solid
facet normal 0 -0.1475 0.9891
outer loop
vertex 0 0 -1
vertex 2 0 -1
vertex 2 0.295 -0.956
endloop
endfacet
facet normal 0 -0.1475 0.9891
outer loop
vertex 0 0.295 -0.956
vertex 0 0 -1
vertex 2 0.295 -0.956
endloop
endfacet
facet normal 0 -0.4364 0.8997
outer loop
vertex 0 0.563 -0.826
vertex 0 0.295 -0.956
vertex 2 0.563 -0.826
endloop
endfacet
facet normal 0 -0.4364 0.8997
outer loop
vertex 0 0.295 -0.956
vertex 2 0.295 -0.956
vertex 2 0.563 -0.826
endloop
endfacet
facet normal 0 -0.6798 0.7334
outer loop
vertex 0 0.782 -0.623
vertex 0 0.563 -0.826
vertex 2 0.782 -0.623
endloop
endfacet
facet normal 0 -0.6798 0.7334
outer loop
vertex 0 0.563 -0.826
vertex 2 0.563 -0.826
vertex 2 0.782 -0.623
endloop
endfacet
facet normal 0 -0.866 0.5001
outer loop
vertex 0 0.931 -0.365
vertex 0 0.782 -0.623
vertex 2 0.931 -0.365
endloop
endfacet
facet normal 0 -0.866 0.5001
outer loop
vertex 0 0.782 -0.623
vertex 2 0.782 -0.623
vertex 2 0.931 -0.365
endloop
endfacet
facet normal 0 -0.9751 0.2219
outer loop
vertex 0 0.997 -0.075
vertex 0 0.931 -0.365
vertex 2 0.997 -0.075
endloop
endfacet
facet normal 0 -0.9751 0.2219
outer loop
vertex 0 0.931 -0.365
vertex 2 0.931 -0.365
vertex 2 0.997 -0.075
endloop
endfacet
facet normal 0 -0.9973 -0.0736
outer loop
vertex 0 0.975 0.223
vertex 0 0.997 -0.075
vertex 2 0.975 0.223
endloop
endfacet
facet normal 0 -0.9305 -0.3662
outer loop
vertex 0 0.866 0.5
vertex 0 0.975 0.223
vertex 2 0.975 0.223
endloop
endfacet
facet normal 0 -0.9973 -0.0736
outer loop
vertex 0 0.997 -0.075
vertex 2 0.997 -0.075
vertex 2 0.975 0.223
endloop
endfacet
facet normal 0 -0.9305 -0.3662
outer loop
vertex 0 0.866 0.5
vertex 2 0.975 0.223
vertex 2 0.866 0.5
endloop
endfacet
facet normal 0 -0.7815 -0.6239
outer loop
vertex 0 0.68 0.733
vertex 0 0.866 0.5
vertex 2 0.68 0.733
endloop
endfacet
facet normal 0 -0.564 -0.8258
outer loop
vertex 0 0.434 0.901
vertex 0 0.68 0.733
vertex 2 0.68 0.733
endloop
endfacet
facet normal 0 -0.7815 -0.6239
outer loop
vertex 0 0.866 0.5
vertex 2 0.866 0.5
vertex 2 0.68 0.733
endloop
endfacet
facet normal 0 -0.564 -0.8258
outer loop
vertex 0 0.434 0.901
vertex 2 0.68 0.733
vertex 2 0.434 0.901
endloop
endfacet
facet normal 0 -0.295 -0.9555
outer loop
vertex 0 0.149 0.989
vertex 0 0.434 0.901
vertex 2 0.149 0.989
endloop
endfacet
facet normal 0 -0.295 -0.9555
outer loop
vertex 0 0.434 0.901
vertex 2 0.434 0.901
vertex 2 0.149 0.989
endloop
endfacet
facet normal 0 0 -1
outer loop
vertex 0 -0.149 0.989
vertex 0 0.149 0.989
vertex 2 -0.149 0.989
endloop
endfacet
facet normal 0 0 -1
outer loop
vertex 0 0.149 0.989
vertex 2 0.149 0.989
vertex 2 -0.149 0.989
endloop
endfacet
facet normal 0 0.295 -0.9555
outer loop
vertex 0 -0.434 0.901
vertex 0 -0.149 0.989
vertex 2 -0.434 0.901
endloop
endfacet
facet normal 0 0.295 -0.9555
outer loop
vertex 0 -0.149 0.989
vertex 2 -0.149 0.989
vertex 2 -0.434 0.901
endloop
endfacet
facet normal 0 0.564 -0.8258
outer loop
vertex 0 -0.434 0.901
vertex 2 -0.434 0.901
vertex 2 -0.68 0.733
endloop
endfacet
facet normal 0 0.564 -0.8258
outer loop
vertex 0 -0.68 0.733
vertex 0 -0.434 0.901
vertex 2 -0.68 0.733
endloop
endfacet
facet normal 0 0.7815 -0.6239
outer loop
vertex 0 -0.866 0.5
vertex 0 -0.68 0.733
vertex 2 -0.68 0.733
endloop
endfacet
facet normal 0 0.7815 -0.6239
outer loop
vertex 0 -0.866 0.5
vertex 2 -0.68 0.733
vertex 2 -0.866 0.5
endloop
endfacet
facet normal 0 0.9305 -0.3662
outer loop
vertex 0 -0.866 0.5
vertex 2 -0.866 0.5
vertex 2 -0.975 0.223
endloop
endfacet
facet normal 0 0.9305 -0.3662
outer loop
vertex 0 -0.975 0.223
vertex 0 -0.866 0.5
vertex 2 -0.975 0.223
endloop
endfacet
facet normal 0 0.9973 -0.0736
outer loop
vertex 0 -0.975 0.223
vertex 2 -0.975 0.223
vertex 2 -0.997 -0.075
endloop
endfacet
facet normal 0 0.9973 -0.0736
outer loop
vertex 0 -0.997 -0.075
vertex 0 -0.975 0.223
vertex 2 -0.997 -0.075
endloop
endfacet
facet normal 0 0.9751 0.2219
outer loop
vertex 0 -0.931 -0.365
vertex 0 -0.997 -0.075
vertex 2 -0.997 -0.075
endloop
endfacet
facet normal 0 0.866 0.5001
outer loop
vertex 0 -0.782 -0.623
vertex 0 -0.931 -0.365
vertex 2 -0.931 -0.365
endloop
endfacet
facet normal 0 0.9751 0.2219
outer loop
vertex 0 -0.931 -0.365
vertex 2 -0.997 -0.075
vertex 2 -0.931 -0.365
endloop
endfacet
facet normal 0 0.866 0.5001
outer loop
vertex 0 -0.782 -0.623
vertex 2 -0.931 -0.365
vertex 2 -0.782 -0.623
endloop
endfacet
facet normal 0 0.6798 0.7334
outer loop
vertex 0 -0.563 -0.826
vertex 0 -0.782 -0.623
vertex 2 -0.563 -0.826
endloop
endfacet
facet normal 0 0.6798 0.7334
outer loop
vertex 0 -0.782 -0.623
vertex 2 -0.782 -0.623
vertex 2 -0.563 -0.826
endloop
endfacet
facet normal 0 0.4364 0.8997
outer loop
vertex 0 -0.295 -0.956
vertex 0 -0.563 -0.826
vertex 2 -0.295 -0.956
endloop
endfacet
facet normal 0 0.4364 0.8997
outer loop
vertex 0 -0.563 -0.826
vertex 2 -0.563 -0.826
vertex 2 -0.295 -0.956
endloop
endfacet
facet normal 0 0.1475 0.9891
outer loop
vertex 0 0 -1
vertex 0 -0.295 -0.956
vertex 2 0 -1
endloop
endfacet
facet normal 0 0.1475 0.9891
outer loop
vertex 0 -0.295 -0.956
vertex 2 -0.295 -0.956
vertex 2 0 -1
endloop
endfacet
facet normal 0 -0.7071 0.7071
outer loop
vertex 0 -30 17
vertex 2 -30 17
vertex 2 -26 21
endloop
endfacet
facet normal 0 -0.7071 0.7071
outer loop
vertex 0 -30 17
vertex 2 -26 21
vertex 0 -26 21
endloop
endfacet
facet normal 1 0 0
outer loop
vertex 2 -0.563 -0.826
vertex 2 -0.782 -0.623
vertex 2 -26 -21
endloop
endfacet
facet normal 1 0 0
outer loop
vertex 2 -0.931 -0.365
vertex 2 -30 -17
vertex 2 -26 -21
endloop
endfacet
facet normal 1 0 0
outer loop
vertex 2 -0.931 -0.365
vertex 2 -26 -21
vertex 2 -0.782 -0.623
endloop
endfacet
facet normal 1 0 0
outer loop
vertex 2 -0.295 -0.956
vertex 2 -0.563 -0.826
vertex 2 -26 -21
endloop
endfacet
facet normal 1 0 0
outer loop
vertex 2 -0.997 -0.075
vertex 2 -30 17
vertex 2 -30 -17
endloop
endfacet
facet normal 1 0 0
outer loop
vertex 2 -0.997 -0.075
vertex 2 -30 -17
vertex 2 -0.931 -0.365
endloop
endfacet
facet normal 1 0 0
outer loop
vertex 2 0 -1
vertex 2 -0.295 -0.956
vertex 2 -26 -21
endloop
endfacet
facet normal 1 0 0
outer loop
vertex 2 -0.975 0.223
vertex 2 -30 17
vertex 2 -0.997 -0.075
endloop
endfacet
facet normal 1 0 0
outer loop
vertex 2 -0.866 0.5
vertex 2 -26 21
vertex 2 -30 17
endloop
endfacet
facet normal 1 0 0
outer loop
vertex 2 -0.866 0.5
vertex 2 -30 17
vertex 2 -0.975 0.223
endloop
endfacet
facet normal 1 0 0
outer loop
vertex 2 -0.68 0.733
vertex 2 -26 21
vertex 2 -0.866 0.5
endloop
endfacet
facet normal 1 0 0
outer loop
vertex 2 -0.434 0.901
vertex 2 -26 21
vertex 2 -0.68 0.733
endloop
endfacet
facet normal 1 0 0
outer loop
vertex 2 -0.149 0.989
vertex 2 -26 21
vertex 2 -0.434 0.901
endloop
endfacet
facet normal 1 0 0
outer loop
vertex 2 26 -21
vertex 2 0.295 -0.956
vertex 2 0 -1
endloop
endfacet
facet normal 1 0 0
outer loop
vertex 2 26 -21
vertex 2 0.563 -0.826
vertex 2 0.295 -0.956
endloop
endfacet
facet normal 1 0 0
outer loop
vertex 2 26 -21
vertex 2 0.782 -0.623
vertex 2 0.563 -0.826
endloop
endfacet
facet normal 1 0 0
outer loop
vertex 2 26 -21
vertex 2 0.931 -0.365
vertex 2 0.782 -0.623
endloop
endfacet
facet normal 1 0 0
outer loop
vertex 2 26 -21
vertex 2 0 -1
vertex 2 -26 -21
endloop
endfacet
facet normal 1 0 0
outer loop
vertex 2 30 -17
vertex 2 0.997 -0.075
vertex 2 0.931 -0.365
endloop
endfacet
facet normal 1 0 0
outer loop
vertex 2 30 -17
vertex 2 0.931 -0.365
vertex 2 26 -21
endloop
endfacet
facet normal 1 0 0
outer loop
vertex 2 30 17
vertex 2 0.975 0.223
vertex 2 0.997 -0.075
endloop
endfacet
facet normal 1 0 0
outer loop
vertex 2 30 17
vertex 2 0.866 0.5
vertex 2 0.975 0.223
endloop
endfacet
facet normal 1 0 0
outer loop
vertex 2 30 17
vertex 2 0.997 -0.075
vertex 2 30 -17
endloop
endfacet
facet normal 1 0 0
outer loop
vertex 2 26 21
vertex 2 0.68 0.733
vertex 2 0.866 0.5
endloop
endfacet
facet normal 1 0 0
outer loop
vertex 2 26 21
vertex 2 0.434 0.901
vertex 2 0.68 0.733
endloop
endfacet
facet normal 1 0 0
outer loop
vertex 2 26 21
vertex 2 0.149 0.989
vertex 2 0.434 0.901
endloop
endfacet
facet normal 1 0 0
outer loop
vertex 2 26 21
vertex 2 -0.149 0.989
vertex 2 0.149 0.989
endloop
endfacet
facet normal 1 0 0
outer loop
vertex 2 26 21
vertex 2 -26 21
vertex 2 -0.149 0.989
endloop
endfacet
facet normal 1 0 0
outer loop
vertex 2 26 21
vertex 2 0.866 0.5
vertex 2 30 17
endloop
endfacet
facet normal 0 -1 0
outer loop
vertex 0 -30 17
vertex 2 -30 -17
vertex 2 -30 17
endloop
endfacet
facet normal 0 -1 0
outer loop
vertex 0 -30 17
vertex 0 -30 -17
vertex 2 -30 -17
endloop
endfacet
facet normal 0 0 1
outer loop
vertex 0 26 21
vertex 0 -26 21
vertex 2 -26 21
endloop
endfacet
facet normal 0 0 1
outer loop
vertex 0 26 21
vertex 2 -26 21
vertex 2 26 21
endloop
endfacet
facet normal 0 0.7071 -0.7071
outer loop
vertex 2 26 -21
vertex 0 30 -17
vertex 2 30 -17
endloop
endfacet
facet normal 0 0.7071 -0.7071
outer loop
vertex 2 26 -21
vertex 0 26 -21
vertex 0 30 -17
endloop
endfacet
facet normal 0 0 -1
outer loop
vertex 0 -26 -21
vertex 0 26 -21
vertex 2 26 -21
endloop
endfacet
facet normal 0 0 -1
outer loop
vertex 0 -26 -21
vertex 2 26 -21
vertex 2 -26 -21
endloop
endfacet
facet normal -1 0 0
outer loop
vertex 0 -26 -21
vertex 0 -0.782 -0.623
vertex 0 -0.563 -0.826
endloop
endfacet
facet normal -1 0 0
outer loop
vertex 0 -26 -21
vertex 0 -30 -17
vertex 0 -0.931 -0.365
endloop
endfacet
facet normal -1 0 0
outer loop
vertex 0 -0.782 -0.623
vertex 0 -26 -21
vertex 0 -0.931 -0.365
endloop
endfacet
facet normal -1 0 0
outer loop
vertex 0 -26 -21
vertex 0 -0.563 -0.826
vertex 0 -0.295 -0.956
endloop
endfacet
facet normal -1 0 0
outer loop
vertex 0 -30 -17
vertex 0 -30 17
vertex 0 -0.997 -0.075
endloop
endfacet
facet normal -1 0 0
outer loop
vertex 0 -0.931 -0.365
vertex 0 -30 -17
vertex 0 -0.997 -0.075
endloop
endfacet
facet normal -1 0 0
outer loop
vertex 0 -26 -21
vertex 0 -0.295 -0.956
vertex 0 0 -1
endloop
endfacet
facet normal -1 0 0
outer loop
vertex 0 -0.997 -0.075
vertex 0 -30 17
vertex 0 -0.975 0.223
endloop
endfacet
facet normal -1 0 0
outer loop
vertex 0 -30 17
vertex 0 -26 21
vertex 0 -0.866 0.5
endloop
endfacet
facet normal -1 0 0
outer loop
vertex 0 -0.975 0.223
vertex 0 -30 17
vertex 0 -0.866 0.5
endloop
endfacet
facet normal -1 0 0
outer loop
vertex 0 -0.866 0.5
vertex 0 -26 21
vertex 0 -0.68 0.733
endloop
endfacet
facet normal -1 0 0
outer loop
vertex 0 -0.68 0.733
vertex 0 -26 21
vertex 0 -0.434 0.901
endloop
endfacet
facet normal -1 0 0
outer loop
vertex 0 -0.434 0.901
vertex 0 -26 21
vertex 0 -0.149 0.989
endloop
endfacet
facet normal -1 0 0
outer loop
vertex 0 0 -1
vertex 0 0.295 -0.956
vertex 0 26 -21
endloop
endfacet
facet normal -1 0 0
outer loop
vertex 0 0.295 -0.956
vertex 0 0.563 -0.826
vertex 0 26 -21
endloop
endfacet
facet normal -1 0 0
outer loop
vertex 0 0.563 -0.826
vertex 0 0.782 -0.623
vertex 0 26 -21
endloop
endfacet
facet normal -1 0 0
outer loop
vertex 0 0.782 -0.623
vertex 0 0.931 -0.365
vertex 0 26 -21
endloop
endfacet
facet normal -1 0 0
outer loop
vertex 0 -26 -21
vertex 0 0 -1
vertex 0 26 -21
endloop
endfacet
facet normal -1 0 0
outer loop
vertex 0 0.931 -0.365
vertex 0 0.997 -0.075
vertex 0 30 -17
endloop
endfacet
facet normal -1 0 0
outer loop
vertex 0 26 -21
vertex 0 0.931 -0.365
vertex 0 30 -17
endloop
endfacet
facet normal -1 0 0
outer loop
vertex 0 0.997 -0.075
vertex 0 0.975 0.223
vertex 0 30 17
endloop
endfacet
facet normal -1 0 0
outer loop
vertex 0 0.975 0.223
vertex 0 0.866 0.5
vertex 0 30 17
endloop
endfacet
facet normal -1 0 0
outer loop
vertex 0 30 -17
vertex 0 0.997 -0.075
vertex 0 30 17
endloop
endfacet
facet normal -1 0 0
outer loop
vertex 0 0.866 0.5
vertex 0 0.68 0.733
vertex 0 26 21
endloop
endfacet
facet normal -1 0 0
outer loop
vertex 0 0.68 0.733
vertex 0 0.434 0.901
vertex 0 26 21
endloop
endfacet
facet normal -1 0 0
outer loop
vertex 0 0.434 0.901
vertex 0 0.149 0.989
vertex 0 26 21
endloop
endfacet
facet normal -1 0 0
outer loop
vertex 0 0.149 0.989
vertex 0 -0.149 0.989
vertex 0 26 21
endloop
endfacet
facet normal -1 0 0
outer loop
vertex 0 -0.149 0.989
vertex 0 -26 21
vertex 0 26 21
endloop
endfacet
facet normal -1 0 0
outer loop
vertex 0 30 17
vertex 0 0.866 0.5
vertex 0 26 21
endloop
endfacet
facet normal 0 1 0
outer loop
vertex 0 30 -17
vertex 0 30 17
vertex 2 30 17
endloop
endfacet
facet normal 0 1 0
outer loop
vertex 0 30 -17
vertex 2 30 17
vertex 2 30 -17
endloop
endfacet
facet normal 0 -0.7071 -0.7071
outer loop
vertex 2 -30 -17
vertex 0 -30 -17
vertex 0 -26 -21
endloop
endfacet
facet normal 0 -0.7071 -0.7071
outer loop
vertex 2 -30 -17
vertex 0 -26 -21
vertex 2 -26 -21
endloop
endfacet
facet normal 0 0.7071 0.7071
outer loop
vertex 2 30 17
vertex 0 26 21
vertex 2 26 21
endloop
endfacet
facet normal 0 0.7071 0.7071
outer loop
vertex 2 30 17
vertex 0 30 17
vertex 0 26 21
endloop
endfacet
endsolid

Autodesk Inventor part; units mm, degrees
ref_plane "YZ Plane" through (0, 0, 0) normal (1, 0, 0) x (0, 1, 0)
ref_plane "XZ Plane" through (0, 0, 0) normal (0, 1, 0) x (-1, 0, 0)
ref_plane "XY Plane" through (0, 0, 0) normal (0, 0, 1) x (1, 0, 0)
sketch "Sketch1" plane through (0, 0, 0) normal (1, 0, 0) x (0, 1, 0)
  line L0 (-30, 21) -> (30, 21)
  line L1 (30, 21) -> (30, -21)
  line L2 (30, -21) -> (-30, -21)
  line L3 (-30, -21) -> (-30, 21)
  line L4 (-30, 21) -> (30, -21) construction
  line L5 (30, 21) -> (-30, -21) construction
  point P0 (0, 0)
  dimension "d0" = 60
  dimension "d1" = 42
extrude "Extrusion1" add sketch "Sketch1" along normal blind 2
chamfer "Chamfer1" distance 4 angle 45 4 edges at (1, -30, 21) (1, -30, -21) (1, 30, -21) (1, 30, 21)
sketch "Sketch2" plane through (2, 0, 0) normal (1, 0, 0) x (0, 0, -1)
  circle A0 centre (0, 0) radius 1
  dimension "d7" = 2
extrude "Extrusion2" cut sketch "Sketch2" against normal blind 2
properties part number "card"
